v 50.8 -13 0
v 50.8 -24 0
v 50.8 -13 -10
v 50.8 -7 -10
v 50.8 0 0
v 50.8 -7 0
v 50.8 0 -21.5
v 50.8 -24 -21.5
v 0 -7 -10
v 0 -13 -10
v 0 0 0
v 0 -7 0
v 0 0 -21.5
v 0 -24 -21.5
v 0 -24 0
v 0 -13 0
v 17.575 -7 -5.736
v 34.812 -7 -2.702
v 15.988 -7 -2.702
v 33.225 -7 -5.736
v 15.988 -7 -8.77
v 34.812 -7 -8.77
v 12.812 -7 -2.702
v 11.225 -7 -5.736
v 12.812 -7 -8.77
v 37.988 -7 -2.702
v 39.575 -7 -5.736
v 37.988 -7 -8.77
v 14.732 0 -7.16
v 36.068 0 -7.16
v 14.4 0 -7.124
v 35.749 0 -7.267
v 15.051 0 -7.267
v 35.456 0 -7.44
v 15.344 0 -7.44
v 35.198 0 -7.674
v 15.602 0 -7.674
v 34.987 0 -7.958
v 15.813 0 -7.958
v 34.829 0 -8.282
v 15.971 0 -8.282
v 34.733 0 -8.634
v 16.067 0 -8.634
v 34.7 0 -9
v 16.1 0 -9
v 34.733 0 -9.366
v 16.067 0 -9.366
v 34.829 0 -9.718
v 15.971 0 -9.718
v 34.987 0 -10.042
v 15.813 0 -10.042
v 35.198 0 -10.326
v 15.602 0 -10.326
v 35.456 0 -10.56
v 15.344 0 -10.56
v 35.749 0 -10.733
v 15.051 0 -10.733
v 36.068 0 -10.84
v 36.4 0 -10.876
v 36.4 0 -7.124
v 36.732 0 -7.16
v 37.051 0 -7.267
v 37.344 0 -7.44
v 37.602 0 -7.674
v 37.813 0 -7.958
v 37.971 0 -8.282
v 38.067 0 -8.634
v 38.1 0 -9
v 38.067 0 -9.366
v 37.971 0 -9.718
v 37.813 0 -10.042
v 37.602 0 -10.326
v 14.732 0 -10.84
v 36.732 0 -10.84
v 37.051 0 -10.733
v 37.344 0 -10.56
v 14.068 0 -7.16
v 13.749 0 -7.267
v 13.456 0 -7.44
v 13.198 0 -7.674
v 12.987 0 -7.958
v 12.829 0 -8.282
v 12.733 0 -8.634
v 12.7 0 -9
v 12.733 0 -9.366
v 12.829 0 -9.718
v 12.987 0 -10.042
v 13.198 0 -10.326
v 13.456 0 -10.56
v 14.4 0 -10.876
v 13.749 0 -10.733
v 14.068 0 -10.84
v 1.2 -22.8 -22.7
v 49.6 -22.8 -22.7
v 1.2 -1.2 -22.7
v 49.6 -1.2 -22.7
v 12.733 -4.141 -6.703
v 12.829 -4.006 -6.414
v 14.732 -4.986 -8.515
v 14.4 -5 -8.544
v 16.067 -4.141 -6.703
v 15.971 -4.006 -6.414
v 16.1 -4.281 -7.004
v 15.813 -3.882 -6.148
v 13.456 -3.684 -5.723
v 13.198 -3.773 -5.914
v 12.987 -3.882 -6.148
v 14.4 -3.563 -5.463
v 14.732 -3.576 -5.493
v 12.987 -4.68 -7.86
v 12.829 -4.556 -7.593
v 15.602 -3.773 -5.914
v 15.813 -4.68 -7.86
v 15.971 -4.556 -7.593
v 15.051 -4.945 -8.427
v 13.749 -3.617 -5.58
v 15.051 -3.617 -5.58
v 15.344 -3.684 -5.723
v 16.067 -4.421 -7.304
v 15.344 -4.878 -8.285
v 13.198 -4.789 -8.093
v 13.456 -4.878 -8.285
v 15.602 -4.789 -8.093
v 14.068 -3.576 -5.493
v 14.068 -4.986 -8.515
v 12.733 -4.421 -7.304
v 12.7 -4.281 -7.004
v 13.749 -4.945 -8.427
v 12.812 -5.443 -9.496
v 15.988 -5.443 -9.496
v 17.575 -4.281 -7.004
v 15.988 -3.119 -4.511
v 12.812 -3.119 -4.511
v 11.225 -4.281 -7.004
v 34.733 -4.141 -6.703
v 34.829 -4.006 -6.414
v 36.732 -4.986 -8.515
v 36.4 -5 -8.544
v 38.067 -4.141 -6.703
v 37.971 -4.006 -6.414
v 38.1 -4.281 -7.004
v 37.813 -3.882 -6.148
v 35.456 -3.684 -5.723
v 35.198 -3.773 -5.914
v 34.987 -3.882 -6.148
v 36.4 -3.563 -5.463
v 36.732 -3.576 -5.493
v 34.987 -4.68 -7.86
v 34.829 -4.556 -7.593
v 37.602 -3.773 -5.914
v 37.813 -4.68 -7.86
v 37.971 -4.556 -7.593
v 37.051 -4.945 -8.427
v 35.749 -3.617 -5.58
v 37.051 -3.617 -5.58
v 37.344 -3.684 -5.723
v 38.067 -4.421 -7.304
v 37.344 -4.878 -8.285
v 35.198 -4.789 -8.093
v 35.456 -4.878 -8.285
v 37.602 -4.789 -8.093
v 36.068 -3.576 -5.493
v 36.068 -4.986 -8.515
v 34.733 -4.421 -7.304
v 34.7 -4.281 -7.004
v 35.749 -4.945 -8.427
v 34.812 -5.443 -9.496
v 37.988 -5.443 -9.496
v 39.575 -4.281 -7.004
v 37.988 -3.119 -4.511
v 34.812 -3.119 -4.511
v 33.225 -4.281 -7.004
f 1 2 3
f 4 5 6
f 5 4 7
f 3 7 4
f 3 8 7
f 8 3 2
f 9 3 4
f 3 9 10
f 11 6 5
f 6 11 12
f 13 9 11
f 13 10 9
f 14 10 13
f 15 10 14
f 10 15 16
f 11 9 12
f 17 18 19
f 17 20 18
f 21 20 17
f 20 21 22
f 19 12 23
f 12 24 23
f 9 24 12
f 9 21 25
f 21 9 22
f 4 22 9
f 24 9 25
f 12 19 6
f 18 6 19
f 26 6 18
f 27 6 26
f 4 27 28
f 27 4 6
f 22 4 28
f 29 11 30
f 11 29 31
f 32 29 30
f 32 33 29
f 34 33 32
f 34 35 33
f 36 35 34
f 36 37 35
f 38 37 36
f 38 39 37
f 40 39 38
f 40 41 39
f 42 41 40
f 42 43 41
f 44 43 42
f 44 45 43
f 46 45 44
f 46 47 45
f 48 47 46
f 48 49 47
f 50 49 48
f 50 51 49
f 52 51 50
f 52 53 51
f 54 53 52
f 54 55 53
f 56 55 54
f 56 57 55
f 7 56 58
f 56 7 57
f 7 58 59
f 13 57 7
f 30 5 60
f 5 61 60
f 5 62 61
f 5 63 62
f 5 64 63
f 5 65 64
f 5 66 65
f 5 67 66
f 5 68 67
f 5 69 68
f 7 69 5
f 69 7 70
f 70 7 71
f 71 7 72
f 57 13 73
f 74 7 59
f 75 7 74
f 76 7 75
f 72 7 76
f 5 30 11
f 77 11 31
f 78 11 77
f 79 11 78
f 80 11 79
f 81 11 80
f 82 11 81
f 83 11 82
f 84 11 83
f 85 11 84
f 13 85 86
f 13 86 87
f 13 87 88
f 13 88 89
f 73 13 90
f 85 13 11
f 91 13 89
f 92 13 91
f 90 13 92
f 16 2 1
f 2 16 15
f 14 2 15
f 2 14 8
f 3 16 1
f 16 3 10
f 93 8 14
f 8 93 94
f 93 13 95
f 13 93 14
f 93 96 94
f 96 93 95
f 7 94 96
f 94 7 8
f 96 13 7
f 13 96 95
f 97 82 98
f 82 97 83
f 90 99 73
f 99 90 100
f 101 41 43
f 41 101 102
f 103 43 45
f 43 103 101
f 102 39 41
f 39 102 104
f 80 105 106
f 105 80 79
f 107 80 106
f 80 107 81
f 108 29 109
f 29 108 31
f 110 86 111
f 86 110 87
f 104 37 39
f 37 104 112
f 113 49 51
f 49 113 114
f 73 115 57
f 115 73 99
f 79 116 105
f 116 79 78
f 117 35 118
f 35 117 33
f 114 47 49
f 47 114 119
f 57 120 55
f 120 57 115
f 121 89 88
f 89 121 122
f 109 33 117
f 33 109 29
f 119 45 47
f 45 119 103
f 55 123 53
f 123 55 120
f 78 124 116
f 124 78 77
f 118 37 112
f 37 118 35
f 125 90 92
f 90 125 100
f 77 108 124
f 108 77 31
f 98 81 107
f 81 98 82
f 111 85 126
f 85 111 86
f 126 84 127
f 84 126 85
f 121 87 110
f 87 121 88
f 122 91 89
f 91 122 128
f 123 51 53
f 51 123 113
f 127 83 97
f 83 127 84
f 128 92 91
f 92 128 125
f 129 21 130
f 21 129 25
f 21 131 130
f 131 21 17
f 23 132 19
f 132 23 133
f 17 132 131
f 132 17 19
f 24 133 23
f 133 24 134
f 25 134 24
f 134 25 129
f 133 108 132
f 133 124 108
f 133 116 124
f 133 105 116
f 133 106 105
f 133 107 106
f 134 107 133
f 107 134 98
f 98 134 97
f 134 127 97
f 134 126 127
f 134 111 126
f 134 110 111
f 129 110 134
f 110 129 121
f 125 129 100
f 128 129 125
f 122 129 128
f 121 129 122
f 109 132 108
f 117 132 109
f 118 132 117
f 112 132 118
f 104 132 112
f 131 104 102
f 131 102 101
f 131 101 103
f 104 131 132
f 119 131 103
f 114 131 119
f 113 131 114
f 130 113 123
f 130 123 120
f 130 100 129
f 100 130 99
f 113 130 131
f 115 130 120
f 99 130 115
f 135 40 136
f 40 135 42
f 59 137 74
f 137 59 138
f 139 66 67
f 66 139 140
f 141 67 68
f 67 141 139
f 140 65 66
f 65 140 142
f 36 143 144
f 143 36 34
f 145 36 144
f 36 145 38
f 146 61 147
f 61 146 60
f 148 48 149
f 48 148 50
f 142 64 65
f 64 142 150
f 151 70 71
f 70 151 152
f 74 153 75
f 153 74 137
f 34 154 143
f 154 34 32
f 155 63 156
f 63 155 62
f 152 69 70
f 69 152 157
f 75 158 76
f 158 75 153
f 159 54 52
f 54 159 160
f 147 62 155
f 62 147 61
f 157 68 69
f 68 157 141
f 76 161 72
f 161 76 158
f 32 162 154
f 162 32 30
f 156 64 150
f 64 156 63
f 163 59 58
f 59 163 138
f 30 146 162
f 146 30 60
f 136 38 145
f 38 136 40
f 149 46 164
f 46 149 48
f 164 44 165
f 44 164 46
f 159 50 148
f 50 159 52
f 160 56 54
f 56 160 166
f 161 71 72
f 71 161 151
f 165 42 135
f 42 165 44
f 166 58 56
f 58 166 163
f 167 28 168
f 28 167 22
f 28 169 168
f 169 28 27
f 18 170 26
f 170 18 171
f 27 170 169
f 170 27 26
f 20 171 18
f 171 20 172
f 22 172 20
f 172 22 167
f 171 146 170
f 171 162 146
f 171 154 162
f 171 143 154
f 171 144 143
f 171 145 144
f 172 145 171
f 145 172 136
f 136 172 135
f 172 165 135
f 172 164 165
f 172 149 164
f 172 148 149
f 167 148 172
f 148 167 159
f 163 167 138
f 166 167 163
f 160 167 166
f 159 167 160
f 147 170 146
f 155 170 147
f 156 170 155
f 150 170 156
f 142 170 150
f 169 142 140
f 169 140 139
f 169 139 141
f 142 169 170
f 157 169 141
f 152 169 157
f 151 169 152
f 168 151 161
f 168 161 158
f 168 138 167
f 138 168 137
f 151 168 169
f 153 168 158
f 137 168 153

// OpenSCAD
// ============================================================
//  Sliding Door Track Lock
//  Initial design by Claude, refined by a human.
// ============================================================

/* [Main Dimensions] */
// Along the track
body_length    = 50.8;
// Overall front-to-back
body_width     = 24.0;
// Height of upper block (above channel legs)
body_height    = 12.7;

/* [U-Channel] */
// channel opening width
slot_width     = 6.0;
// channel depth (leg height)
slot_depth     = 10.0;

/* [Wall thicknesses — asymmetric] */
// screw side ~ back_wall_t is derived: body_width - slot_width - front_wall_t
front_wall_t   = 7.0;
// back_wall_t is derived: body_width - slot_width - front_wall_t = 11mm

// M3 hex nut: 5.5mm across-flats, 2.4mm thick
/* [Bolt + Nut sizing] */
// clearance hole M3=3.4 M4=4.8
bolt_dia       = 3.4;    // mm — M3 clearance hole (slightly oversized)
// across flats M3=5.5 M4=7.0
nut_af         = 5.5;    // mm — across flats
// recess depth M3=3.0 M4=4.0
nut_depth      = 3.0;    // mm — recess depth (slightly over nut thickness for easy seating)

/* [Bolt Positioning] */
bolt_count     = 2;
// center-to-center along length
bolt_spacing   = 22.0;
// Move bolts up or down
bolt_vert_offset = 4;
bolt_height    = slot_depth / 2 + bolt_vert_offset;  // mm — vertical center in the channel leg
// degrees — tilt from horizontal, head-end downward
bolt_angle     = 25;

/* [Chamfer] */
c = 1.2;

// ============================================================
//  Derived values
// ============================================================
back_wall_t  = body_width - slot_width - front_wall_t;  // = 11mm

bolt_x_start = (body_length - bolt_spacing) / 2;

// ============================================================
//  MODULE: hex_recess
//  Hexagonal nut pocket, oriented for a flat-to-flat insertion.
//  Placed on the INNER face of the front channel wall so the
//  nut can be pressed/melted in with a soldering iron.
// ============================================================
module hex_recess(depth) {
    // 6-sided polygon extruded — flat side up/down for best print orientation
    rotate([0, 0, 0])   // orient flat face toward channel opening
        cylinder(d = nut_af / cos(30), h = depth, $fn = 6);
}

// ============================================================
//  MODULE: main_body
//  Solid upper block with chamfered top edges
// ============================================================
module main_body() {
    hull() {
        // Bottom of body (full footprint at channel top)
        translate([0, 0, slot_depth])
            cube([body_length, body_width, 0.01]);
        // Top, chamfered inward
        translate([c, c, slot_depth + body_height - c])
            cube([body_length - 2*c, body_width - 2*c, c]);
        // Sides, chamfered only at top
        translate([0, 0, slot_depth])
            cube([body_length, body_width, body_height - c]);
    }
}

// ============================================================
//  MODULE: channel_walls
//  The two legs of the inverted U-channel
// ============================================================
module channel_walls() {
    // Front wall — screw side, 7mm thick
    cube([body_length, front_wall_t, slot_depth]);
    // Back wall — solid, 11mm thick (extra material since channel narrowed)
    translate([0, body_width - back_wall_t, 0])
        cube([body_length, back_wall_t, slot_depth]);
}

// ============================================================
//  MODULE: bolt_holes_and_nut_recesses
//  Subtracted from the assembly:
//    - Clearance bore through the front wall at bolt_angle
//      (head-end tilted downward for overhead installation)
//    - Hex nut recess at the inner face, aligned to bolt axis
//
//  Geometry: origin is placed at the outer face of the front
//  wall. rotate([-90 + bolt_angle, 0, 0]) tilts the bore so
//  the entry (head) end is lower and the nut end is higher —
//  natural driving angle when the part is above your head.
//
//  Bore length along axis = front_wall_t / cos(bolt_angle)
//  Nut Z-rise through wall = front_wall_t * tan(bolt_angle)
// ============================================================
module bolt_holes_and_nut_recesses() {
    // Length along the angled axis to fully traverse the front wall
    bore_len = front_wall_t / cos(-bolt_angle) + 2;  // +2 for clean boolean overrun

    for (i = [0 : bolt_count - 1]) {
        x = bolt_x_start + i * bolt_spacing;

        translate([x, 0, bolt_height])
            rotate([-90 + -bolt_angle, 0, 0]) {
                // Clearance bore — starts 1mm before outer face, exits inner face
                translate([0, 0, -2])
                    cylinder(d = bolt_dia, h = bore_len + 1, $fn = 32);

                // Hex nut recess — pocket from inner face back into wall
                translate([0, 0, front_wall_t / cos(-bolt_angle) - nut_depth])
                    hex_recess(nut_depth + 2); // +2 for clean boolean overrun
            }
    }
}

// ============================================================
//  ASSEMBLY
// ============================================================
rotate([180, 0, 0])
difference() {
    union() {
        main_body();
        channel_walls();
    }
    bolt_holes_and_nut_recesses();
}
